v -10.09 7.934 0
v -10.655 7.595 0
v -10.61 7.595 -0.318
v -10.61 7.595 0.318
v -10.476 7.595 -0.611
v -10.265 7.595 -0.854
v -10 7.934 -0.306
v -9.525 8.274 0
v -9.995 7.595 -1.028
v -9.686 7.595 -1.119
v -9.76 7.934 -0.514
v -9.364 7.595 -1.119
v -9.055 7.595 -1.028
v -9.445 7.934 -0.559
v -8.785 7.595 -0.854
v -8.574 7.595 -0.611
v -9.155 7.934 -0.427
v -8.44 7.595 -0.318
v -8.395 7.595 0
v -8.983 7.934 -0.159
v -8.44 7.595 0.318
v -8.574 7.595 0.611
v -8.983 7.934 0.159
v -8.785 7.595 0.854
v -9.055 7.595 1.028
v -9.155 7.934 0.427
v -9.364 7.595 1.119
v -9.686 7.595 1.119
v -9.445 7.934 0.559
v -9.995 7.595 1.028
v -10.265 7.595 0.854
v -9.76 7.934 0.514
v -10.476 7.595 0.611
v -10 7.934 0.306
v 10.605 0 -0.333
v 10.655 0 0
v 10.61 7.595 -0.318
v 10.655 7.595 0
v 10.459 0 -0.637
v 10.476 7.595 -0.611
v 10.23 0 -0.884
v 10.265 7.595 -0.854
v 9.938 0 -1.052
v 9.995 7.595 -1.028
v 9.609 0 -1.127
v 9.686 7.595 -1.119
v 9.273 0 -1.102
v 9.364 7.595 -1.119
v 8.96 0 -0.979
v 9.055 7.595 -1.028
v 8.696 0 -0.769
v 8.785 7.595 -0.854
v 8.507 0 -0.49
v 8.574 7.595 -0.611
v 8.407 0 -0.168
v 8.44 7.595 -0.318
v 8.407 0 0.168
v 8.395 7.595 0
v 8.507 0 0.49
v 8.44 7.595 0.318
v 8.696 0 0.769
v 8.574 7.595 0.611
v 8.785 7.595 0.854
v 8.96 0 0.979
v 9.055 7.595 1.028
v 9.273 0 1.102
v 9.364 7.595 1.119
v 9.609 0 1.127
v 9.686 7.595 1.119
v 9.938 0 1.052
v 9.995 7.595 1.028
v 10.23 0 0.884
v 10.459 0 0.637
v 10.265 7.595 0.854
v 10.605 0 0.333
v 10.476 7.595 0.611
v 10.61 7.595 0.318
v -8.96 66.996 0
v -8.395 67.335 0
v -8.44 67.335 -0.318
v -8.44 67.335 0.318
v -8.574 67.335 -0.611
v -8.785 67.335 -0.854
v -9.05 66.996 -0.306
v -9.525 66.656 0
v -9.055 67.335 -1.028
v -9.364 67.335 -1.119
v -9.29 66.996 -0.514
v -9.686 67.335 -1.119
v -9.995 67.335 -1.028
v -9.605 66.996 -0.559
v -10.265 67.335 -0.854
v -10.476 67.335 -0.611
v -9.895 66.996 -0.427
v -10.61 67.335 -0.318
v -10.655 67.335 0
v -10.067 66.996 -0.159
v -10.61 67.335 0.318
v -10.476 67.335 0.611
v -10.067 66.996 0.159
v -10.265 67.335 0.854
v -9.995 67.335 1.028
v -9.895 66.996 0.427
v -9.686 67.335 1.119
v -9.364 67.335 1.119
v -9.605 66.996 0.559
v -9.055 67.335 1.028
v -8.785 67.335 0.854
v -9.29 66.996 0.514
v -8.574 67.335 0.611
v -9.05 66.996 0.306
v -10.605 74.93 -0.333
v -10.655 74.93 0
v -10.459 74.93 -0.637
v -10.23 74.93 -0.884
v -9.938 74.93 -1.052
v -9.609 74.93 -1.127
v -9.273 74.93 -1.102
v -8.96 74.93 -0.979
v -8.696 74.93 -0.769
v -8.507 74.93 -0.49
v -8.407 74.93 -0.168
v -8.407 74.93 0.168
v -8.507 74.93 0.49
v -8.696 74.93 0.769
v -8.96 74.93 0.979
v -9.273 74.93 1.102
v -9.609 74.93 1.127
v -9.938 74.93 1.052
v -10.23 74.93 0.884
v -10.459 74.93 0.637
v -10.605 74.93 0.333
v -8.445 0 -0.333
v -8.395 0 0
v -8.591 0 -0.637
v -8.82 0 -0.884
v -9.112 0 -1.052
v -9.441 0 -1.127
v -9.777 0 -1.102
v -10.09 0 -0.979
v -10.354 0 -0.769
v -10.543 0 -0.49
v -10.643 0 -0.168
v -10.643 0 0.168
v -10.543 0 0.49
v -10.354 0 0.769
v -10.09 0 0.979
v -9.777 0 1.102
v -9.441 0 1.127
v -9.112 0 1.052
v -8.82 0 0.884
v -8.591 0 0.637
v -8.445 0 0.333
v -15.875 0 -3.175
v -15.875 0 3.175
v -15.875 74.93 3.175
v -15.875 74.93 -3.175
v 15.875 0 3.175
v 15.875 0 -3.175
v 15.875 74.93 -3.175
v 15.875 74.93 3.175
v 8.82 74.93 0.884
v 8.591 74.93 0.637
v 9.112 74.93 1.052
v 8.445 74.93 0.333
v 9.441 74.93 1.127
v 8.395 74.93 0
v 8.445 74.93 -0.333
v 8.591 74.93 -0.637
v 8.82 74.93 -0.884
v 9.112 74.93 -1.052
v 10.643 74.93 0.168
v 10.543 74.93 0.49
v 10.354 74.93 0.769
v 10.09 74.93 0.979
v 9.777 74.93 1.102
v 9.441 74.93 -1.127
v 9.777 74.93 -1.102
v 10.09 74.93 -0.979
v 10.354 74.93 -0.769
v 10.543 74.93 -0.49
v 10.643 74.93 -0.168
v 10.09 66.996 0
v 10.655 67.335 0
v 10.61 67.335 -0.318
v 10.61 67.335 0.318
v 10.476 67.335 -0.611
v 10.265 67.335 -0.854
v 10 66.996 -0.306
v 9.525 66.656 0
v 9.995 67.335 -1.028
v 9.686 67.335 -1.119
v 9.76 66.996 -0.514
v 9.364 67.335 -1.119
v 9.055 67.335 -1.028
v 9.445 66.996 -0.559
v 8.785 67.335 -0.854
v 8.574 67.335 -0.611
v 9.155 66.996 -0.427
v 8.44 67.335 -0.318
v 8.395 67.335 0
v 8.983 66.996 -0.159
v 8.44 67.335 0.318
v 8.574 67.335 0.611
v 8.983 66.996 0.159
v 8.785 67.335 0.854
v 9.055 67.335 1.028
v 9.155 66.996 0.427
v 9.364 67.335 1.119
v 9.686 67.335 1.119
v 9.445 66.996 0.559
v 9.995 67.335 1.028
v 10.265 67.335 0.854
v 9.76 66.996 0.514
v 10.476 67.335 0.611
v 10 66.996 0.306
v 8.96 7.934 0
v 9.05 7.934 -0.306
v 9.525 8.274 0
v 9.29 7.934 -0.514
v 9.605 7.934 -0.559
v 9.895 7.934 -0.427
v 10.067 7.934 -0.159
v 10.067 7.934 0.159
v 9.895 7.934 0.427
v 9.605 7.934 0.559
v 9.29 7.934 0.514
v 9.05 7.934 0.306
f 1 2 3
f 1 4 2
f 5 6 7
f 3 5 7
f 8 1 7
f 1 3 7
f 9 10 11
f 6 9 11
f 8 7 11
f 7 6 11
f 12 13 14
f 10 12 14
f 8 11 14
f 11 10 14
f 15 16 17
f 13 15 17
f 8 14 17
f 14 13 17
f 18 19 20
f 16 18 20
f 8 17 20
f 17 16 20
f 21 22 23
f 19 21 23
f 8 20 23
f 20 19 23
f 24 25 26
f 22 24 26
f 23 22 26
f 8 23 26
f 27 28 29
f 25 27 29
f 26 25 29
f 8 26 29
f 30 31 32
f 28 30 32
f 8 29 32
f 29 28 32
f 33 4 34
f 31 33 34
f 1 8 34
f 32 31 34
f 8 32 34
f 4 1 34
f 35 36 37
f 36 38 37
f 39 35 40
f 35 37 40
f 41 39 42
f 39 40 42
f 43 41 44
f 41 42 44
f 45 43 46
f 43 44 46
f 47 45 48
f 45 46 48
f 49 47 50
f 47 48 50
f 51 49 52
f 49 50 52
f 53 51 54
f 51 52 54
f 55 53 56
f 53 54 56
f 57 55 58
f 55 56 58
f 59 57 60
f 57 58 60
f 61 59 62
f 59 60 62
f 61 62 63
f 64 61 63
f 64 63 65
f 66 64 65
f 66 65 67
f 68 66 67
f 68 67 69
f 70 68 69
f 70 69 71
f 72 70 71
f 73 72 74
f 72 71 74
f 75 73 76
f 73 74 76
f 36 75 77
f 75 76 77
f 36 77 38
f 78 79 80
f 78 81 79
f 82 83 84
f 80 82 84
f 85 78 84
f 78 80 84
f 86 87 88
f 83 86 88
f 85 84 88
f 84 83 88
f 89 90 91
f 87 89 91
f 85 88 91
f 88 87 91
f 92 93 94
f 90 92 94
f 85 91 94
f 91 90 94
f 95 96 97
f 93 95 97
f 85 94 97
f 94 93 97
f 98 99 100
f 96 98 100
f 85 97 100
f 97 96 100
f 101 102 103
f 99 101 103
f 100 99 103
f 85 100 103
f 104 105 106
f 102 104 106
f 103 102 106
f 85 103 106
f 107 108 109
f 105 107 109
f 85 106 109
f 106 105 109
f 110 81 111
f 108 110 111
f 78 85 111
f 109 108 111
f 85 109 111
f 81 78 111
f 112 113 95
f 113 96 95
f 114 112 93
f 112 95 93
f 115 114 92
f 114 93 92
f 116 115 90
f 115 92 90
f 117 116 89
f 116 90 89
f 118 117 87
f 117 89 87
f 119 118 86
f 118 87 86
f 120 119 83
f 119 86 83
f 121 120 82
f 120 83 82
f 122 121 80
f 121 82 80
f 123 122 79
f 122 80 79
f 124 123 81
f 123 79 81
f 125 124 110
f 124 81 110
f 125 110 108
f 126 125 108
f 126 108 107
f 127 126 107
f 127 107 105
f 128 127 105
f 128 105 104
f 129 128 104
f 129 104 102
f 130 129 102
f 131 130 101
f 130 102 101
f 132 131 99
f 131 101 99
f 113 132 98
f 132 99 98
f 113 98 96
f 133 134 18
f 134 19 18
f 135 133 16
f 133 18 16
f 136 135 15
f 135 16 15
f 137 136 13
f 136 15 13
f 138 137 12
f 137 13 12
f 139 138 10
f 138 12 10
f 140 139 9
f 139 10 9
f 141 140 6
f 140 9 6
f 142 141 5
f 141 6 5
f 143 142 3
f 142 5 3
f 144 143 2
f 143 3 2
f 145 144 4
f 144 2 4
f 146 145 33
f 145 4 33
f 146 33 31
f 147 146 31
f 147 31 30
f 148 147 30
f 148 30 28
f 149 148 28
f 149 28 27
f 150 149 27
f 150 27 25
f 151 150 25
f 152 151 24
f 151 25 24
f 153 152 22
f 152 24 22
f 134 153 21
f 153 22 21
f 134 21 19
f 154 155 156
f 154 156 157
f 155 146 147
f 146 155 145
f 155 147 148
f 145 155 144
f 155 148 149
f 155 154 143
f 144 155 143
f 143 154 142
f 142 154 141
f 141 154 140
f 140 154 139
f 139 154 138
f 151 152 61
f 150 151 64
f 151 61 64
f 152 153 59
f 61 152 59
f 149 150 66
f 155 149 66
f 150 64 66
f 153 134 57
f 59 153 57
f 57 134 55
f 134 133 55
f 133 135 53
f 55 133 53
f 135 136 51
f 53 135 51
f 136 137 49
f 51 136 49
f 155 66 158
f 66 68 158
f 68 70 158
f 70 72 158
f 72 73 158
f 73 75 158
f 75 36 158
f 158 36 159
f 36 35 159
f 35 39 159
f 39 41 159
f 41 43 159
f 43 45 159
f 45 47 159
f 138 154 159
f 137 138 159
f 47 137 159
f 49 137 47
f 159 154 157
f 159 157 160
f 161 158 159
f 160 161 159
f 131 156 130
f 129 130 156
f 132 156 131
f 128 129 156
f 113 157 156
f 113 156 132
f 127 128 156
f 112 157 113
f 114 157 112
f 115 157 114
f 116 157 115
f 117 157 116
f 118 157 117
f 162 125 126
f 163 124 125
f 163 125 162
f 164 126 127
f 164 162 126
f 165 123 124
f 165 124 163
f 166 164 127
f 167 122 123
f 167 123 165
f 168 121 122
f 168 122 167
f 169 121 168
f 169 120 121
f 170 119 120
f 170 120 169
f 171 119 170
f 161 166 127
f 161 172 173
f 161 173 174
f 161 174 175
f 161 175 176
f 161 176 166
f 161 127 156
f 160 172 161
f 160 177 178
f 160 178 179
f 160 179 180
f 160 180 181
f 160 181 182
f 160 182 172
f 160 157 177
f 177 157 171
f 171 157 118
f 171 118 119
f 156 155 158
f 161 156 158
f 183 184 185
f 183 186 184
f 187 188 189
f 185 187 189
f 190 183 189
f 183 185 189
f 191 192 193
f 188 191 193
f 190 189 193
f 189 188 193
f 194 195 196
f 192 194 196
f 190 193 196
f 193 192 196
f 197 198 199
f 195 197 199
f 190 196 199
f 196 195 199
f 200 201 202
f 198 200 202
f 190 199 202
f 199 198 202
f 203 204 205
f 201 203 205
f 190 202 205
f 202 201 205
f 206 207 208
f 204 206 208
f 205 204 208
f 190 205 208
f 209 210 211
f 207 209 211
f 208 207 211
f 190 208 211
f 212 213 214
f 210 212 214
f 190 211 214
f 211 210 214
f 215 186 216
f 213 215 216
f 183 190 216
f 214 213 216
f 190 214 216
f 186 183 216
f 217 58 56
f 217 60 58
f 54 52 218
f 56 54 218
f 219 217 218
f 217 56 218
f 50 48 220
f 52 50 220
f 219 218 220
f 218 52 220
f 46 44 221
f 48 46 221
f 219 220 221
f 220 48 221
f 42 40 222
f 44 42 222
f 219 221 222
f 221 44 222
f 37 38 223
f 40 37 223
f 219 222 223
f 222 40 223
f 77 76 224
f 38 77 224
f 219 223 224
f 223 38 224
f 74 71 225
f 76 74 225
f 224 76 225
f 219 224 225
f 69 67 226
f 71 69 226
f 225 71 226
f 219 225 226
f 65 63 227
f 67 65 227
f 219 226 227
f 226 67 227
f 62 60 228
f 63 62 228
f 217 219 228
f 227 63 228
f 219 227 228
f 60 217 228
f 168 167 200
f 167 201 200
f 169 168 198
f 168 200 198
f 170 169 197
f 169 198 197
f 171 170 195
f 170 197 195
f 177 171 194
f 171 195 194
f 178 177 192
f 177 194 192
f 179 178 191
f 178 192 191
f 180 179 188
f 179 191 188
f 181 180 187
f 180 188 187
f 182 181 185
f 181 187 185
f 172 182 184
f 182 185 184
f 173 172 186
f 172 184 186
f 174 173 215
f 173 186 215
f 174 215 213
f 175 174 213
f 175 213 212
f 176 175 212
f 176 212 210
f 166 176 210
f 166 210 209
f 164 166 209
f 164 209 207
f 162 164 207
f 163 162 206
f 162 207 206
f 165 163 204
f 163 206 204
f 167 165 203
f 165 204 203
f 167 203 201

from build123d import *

# Parameters (mm, degrees)
SKETCH1_W                 = 31.75
SKETCH1_H                 = 6.35
BOSS_EXTRUDE1_DEPTH       = 74.93
F_4_40_TAPPED_HOLE1_D     = 2.2606
F_4_40_TAPPED_HOLE1_DEPTH = 7.5946
F_4_40_TAPPED_HOLE1_TIP   = 0.679152758
F_4_40_TAPPED_HOLE2_D     = 2.2606
F_4_40_TAPPED_HOLE2_DEPTH = 7.5946
F_4_40_TAPPED_HOLE2_TIP   = 0.679152758


with BuildPart() as part:
    # Sketch1 → Boss-Extrude1 (new body)
    with BuildSketch(Plane(origin=(0, 0, 0), x_dir=(1, 0, 0), z_dir=(0, 1, 0))):
        Rectangle(SKETCH1_W, SKETCH1_H)
    extrude(amount=BOSS_EXTRUDE1_DEPTH)

    # #4-40 Tapped Hole1
    with Locations(Plane(origin=(0, 0, 0), x_dir=(-1, 0, 0), z_dir=(0, -1, 0))):
        with Locations((9.525, 0), (-9.525, 0)):
            Hole(F_4_40_TAPPED_HOLE1_D / 2, depth=F_4_40_TAPPED_HOLE1_DEPTH)
            with Locations((0, 0, -(F_4_40_TAPPED_HOLE1_DEPTH + F_4_40_TAPPED_HOLE1_TIP / 2))):  # 118° drill point
                Cone(0, F_4_40_TAPPED_HOLE1_D / 2, F_4_40_TAPPED_HOLE1_TIP, mode=Mode.SUBTRACT)

    # #4-40 Tapped Hole2
    with Locations(Plane(origin=(0, 74.93, 0), x_dir=(1, 0, 0), z_dir=(0, 1, 0))):
        with Locations((-9.525, 0), (9.525, 0)):
            Hole(F_4_40_TAPPED_HOLE2_D / 2, depth=F_4_40_TAPPED_HOLE2_DEPTH)
            with Locations((0, 0, -(F_4_40_TAPPED_HOLE2_DEPTH + F_4_40_TAPPED_HOLE2_TIP / 2))):  # 118° drill point
                Cone(0, F_4_40_TAPPED_HOLE2_D / 2, F_4_40_TAPPED_HOLE2_TIP, mode=Mode.SUBTRACT)


solid = part.part
